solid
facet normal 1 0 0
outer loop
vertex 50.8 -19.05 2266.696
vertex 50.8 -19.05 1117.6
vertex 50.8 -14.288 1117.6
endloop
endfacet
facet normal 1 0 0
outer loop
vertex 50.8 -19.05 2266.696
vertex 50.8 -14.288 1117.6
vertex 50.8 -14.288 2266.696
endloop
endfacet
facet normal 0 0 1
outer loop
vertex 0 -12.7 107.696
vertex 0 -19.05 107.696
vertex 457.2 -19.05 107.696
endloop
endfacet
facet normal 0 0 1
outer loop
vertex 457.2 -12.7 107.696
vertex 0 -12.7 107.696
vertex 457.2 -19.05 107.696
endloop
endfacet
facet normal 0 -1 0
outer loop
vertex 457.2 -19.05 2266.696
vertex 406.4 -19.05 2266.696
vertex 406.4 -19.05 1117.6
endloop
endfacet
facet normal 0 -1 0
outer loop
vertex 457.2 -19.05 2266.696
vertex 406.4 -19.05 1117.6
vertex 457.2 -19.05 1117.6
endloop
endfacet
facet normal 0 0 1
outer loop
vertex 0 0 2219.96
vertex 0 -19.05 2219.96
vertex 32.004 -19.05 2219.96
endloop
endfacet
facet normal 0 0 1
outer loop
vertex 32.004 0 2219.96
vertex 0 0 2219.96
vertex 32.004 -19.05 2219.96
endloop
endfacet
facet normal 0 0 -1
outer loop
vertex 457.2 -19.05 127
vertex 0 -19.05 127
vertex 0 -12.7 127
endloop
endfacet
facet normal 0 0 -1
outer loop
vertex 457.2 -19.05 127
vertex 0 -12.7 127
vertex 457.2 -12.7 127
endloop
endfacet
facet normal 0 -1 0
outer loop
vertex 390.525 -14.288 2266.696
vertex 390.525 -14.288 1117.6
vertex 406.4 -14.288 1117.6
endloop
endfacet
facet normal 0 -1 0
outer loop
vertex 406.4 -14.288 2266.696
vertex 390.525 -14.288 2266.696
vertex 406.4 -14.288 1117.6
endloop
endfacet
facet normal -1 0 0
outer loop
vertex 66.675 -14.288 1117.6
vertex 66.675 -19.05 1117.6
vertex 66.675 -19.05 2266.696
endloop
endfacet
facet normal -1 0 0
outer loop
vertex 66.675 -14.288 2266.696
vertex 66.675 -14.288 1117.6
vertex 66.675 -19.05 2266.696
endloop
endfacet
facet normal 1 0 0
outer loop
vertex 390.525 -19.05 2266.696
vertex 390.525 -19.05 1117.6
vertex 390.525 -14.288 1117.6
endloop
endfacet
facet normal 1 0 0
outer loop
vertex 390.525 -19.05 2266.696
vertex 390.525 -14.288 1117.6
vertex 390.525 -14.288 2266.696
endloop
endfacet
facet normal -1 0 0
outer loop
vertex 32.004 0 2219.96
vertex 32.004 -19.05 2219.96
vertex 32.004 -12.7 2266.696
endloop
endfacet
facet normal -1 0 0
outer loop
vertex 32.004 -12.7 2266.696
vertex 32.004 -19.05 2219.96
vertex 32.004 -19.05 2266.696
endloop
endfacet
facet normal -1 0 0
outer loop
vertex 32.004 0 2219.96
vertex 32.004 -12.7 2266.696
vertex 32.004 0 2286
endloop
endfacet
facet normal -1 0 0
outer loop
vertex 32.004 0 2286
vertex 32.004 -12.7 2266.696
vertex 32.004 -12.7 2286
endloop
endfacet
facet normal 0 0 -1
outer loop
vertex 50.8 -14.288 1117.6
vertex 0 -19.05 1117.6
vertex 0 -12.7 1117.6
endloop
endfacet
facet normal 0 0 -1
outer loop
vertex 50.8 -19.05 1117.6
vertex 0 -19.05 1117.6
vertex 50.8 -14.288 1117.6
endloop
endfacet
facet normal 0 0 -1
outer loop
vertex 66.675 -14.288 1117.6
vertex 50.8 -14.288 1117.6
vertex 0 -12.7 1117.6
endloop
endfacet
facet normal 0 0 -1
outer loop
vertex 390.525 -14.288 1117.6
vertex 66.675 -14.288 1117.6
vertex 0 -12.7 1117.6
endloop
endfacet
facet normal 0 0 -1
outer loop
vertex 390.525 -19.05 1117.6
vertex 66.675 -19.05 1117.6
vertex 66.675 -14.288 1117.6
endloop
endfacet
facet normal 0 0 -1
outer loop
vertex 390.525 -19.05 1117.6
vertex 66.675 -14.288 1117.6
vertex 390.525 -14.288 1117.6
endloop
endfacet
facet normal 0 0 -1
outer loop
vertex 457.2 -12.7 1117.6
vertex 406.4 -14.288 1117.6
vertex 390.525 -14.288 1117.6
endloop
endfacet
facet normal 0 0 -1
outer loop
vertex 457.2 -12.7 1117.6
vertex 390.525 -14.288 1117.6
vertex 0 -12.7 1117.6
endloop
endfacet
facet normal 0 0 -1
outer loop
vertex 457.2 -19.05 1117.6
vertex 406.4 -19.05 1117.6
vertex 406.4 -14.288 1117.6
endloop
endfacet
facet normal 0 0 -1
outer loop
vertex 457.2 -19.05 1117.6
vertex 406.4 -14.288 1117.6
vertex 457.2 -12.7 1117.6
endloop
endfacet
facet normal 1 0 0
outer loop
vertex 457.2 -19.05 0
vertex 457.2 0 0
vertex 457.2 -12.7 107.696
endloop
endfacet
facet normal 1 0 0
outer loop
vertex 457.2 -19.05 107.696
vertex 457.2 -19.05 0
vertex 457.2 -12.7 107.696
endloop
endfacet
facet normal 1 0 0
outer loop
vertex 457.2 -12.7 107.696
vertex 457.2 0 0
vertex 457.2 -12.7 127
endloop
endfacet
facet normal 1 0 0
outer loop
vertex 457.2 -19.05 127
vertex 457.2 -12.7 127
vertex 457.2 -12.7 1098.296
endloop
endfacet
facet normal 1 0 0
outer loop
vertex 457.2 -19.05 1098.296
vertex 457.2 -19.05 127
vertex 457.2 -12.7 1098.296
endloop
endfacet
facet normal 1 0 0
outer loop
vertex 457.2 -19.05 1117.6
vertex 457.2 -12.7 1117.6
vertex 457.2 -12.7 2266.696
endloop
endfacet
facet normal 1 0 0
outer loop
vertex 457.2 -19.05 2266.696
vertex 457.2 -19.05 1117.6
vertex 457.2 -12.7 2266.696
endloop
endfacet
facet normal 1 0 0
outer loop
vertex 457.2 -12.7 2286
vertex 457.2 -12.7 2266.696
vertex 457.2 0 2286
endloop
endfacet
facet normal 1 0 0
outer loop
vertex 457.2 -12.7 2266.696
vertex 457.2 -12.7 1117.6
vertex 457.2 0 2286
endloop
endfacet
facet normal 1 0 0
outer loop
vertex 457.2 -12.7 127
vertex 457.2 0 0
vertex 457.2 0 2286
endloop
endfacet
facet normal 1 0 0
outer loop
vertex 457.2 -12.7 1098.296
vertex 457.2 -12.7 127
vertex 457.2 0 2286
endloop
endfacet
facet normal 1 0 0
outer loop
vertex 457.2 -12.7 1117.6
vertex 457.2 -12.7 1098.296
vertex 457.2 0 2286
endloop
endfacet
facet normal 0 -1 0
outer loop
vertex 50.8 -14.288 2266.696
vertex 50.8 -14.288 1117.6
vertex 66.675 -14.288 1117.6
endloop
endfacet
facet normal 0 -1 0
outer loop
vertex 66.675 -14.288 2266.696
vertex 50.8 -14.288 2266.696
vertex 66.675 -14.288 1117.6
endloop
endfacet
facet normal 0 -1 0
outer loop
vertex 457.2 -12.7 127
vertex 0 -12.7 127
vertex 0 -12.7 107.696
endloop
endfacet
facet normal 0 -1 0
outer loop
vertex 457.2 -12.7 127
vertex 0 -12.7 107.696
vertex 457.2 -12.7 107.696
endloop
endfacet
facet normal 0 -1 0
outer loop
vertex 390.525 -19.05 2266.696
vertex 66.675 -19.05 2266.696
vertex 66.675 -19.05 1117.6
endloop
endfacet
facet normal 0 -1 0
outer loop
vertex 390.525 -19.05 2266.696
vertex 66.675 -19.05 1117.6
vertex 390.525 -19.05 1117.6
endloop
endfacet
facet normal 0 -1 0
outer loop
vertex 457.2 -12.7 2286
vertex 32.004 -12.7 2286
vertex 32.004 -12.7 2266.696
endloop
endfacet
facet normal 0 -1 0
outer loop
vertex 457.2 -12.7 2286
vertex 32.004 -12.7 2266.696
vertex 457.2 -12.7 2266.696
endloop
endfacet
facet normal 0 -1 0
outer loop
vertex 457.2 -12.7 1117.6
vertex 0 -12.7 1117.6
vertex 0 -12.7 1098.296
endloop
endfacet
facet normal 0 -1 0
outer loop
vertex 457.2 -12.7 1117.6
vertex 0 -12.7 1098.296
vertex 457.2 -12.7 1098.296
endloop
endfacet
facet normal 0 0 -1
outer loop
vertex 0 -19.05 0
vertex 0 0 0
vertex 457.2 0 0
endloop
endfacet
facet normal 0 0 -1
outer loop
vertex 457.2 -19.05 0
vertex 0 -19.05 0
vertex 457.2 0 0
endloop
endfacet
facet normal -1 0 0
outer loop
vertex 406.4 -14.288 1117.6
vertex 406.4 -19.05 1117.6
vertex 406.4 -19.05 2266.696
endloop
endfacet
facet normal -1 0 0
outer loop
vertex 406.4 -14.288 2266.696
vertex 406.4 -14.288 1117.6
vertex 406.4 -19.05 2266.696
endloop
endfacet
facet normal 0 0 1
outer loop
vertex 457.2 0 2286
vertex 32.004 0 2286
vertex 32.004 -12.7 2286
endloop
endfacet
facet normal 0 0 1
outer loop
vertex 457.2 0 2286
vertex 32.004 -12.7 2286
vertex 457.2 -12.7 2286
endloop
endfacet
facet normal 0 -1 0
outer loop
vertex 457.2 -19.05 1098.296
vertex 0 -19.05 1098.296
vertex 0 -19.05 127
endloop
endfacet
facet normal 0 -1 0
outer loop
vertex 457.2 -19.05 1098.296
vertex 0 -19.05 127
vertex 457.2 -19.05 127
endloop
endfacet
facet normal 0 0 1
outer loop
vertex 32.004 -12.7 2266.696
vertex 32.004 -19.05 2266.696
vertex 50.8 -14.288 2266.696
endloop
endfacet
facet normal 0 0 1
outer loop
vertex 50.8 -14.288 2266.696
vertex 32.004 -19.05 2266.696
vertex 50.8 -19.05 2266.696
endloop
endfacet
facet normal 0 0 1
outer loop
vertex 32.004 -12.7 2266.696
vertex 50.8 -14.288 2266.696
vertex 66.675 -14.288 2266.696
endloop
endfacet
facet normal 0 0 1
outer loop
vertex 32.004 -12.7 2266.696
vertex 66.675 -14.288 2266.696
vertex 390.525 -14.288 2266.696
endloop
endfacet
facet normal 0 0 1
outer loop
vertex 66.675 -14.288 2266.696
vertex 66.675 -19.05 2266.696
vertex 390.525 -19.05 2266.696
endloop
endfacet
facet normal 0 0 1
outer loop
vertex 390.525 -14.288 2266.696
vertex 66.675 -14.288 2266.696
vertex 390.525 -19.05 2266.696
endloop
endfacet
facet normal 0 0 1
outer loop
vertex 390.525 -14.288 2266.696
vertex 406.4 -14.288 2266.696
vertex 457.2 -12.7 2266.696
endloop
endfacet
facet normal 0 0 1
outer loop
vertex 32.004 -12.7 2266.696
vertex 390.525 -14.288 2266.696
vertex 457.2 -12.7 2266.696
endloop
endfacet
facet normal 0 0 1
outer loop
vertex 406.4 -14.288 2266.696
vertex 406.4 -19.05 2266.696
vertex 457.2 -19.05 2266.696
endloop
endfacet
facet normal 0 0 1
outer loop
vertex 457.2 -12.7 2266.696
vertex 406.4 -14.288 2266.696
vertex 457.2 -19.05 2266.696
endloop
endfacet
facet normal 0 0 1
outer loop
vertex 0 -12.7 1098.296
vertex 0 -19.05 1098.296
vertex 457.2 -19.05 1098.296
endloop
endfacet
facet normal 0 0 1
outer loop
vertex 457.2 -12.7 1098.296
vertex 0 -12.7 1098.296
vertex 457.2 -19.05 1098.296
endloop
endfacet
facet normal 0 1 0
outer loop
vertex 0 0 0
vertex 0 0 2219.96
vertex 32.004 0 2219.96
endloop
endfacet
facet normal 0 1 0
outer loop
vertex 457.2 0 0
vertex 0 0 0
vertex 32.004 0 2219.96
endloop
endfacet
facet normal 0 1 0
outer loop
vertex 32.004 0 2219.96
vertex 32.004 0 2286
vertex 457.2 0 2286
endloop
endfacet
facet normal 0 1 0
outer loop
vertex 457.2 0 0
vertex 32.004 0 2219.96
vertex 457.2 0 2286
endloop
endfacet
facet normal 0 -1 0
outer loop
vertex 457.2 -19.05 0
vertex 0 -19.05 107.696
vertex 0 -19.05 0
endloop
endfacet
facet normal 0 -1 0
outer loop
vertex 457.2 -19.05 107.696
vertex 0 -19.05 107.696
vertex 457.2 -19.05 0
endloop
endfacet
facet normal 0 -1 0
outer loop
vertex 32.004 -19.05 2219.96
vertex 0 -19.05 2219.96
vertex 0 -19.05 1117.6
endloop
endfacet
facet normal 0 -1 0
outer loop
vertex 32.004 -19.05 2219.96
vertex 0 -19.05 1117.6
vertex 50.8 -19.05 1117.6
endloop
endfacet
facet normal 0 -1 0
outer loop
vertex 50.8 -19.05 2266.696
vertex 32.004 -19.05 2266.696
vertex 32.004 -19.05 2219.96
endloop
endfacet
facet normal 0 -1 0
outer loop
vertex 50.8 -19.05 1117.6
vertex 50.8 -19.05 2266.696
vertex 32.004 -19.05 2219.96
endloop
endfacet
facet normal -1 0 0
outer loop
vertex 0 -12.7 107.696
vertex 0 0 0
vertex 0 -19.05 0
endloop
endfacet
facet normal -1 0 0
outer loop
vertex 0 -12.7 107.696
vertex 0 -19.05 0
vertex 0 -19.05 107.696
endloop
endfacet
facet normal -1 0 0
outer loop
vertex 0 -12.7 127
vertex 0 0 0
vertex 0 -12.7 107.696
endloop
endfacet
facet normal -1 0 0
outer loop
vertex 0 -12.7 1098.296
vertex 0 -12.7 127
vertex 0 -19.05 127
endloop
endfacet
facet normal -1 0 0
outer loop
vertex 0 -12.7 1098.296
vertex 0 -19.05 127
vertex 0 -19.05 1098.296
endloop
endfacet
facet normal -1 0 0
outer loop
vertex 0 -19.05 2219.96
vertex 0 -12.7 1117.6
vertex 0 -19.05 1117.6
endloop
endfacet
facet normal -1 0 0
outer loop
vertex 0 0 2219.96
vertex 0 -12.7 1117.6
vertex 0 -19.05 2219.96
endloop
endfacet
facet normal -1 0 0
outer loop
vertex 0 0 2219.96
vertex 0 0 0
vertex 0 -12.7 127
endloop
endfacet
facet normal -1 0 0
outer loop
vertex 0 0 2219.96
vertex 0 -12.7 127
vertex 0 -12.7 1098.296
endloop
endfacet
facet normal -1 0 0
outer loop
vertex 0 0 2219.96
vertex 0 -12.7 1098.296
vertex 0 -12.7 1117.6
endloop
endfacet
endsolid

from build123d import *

# Parameters (mm, degrees)
F0_W     = 457.2
F0_H     = 2286
F1_DEPTH = 19.05
F2_W     = 32.004
F2_H     = 66.04
F3_DEPTH = 19.051
F4_W     = 530.741885
F4_H     = 19.304
F4_W_2   = 553.289723
F4_W_3   = 548.530197
F4_H_2   = 28.542519
F5_DEPTH = 6.35
F6_W     = 15.875
F6_H     = 1169.065192
F6_H_2   = 1174.501539
F7_DEPTH = 4.7625


with BuildPart() as f1:
    # F0 (on Front) → F1 (new body)
    with BuildSketch(Plane.XZ):
        with Locations((228.6, 1143)):
            Rectangle(F0_W, F0_H)
    extrude(amount=F1_DEPTH)

    # F2 (on face) → F3 (cut, through all)
    with BuildSketch(Plane.XZ.offset(19.05)):
        with Locations((16.002, 2252.98)):
            Rectangle(F2_W, F2_H)
    extrude(amount=-F3_DEPTH, mode=Mode.SUBTRACT)

    # F4 (on face) → F5 (cut)
    with BuildSketch(Plane.XZ.offset(19.05)):
        with Locations((253.698116, 117.348)):
            Rectangle(F4_W, F4_H)
        with Locations((251.708144, 1107.948)):
            Rectangle(F4_W_2, F4_H)
        with Locations((257.628393, 2280.96726)):
            Rectangle(F4_W_3, F4_H_2)
    extrude(amount=-F5_DEPTH, mode=Mode.SUBTRACT)

    # F6 (on face) → F7 (cut)
    with BuildSketch(Plane.XZ.offset(19.05)):
        with Locations((58.7375, 1692.303397)):
            Rectangle(F6_W, F6_H)
        with Locations((398.4625, 1694.760024)):
            Rectangle(F6_W, F6_H_2)
    extrude(amount=-F7_DEPTH, mode=Mode.SUBTRACT)


solid = f1.part
